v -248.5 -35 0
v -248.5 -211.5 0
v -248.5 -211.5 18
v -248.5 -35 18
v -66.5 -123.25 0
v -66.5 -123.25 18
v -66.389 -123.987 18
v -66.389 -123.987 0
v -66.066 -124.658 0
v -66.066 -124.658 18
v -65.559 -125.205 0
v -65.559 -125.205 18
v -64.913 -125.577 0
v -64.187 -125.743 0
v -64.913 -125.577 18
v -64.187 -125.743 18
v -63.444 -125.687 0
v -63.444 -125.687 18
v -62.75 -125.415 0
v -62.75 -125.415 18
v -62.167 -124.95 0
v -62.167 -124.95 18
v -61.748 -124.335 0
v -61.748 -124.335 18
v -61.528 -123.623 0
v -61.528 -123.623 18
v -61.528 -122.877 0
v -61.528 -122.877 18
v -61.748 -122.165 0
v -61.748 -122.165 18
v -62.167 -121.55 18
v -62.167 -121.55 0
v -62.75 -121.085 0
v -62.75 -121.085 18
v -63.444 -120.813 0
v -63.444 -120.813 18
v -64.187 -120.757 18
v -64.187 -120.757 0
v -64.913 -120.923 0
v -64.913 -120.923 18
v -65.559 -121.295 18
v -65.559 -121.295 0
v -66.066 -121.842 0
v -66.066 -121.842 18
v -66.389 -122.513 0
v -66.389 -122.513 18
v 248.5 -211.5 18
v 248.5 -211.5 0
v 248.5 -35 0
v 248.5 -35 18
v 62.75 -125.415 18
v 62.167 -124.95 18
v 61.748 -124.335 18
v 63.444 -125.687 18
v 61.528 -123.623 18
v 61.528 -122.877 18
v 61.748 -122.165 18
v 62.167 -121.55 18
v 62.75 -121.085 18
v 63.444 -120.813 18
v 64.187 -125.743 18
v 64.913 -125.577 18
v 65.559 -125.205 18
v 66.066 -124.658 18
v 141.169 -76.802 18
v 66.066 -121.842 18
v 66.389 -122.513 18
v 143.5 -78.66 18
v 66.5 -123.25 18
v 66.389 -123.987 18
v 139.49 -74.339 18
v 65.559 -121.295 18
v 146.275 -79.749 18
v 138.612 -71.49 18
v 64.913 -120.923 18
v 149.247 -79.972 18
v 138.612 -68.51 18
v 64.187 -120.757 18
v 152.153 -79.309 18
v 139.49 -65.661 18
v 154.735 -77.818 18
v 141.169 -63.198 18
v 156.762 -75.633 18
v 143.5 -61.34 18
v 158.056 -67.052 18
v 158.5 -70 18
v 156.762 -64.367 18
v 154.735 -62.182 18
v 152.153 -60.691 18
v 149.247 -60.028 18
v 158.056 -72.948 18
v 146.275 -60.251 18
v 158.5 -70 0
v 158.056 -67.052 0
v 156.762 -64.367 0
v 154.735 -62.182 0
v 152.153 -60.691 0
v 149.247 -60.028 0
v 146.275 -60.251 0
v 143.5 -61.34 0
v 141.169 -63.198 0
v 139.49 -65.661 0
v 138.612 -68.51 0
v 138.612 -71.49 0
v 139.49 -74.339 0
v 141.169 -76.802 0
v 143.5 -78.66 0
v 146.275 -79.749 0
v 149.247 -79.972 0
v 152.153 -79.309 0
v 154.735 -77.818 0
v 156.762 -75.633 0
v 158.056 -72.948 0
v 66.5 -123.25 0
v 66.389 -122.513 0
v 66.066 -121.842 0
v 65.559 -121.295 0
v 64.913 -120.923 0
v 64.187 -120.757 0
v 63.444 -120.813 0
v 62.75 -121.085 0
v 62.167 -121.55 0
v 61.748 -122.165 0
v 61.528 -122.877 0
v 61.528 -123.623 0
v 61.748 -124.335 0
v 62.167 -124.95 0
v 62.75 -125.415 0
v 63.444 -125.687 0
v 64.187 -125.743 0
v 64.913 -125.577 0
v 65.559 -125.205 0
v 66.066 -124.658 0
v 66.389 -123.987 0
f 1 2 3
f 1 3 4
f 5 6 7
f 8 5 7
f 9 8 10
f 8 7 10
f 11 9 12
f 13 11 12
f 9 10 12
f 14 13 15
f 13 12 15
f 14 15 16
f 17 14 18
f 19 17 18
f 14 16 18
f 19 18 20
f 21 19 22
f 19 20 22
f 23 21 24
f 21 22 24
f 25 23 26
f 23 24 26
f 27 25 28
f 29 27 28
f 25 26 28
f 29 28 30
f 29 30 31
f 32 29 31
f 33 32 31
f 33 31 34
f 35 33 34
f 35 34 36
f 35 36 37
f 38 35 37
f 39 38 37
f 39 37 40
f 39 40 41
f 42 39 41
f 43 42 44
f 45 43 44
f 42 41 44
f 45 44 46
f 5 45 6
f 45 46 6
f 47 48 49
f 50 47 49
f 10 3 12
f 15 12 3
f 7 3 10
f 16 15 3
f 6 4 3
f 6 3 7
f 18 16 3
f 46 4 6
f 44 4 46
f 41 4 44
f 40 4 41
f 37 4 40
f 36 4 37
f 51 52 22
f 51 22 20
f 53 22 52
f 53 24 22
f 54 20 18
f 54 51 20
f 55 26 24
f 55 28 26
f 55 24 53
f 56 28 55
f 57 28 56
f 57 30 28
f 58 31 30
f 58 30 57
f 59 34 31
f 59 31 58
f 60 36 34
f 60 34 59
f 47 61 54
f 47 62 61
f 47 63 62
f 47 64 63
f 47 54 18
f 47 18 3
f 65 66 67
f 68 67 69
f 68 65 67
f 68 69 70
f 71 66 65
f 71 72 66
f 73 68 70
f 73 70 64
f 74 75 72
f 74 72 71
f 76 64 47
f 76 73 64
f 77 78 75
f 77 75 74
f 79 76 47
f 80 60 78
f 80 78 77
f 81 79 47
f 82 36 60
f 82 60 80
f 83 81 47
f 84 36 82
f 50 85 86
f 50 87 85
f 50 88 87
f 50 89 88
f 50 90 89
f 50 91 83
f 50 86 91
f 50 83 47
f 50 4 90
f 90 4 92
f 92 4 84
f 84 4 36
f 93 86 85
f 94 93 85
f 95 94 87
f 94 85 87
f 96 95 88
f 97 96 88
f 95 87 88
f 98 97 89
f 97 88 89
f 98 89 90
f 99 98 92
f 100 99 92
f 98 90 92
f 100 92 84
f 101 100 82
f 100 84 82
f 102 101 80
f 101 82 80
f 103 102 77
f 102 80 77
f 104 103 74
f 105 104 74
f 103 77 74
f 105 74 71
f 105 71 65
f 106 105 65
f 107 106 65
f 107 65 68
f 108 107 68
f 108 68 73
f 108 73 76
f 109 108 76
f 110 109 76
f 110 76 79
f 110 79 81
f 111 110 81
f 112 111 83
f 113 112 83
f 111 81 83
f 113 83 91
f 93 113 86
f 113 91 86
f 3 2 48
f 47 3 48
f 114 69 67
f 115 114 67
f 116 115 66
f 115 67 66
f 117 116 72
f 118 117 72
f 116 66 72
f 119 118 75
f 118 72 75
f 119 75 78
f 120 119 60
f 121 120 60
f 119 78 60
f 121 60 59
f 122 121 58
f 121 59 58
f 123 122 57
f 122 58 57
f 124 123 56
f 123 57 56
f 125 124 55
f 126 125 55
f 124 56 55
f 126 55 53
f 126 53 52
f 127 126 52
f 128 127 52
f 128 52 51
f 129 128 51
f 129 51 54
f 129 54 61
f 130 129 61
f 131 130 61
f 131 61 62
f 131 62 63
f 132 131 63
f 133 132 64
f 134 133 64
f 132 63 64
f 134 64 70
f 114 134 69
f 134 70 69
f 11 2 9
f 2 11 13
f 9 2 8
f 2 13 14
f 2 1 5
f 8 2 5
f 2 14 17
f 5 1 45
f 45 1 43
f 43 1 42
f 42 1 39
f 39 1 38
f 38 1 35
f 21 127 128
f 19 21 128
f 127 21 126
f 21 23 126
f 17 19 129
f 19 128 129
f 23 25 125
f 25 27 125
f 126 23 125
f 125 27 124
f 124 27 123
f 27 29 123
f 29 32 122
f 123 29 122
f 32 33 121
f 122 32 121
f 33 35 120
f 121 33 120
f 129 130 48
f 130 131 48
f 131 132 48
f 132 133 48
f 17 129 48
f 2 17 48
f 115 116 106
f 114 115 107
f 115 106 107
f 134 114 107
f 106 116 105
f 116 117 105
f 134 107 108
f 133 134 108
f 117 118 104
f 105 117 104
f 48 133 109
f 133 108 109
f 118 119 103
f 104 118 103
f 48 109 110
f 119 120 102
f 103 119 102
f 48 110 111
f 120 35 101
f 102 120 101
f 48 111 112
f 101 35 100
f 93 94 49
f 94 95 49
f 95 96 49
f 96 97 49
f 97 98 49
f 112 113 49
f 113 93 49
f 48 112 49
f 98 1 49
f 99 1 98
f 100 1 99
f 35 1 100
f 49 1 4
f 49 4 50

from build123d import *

# Parameters (mm, degrees)
SKETCH1_W           = 497
SKETCH1_H           = 176.5
BOSS_EXTRUDE1_DEPTH = 18
SKETCH4_R           = 2.5
CUT_EXTRUDE3_DEPTH  = 18
SKETCH5_R           = 10
CUT_EXTRUDE4_DEPTH  = 18


with BuildPart() as part:
    # Sketch1 → Boss-Extrude1 (new body)
    with BuildSketch(Plane.XY):
        with Locations((0, -123.25)):
            Rectangle(SKETCH1_W, SKETCH1_H)
    extrude(amount=BOSS_EXTRUDE1_DEPTH)

    # Sketch4 → Cut-Extrude3 (cut)
    with BuildSketch(Plane.XY.offset(18)):
        with Locations((64, -123.25)):
            Circle(SKETCH4_R)
        with Locations(Location((-64, -123.25, 0), (0, 0, 180))):
            Circle(SKETCH4_R)
    extrude(amount=-CUT_EXTRUDE3_DEPTH, mode=Mode.SUBTRACT)

    # Sketch5 → Cut-Extrude4 (cut)
    with BuildSketch(Plane.XY.offset(18)):
        with Locations((148.5, -70)):
            Circle(SKETCH5_R)
    extrude(amount=-CUT_EXTRUDE4_DEPTH, mode=Mode.SUBTRACT)


solid = part.part
